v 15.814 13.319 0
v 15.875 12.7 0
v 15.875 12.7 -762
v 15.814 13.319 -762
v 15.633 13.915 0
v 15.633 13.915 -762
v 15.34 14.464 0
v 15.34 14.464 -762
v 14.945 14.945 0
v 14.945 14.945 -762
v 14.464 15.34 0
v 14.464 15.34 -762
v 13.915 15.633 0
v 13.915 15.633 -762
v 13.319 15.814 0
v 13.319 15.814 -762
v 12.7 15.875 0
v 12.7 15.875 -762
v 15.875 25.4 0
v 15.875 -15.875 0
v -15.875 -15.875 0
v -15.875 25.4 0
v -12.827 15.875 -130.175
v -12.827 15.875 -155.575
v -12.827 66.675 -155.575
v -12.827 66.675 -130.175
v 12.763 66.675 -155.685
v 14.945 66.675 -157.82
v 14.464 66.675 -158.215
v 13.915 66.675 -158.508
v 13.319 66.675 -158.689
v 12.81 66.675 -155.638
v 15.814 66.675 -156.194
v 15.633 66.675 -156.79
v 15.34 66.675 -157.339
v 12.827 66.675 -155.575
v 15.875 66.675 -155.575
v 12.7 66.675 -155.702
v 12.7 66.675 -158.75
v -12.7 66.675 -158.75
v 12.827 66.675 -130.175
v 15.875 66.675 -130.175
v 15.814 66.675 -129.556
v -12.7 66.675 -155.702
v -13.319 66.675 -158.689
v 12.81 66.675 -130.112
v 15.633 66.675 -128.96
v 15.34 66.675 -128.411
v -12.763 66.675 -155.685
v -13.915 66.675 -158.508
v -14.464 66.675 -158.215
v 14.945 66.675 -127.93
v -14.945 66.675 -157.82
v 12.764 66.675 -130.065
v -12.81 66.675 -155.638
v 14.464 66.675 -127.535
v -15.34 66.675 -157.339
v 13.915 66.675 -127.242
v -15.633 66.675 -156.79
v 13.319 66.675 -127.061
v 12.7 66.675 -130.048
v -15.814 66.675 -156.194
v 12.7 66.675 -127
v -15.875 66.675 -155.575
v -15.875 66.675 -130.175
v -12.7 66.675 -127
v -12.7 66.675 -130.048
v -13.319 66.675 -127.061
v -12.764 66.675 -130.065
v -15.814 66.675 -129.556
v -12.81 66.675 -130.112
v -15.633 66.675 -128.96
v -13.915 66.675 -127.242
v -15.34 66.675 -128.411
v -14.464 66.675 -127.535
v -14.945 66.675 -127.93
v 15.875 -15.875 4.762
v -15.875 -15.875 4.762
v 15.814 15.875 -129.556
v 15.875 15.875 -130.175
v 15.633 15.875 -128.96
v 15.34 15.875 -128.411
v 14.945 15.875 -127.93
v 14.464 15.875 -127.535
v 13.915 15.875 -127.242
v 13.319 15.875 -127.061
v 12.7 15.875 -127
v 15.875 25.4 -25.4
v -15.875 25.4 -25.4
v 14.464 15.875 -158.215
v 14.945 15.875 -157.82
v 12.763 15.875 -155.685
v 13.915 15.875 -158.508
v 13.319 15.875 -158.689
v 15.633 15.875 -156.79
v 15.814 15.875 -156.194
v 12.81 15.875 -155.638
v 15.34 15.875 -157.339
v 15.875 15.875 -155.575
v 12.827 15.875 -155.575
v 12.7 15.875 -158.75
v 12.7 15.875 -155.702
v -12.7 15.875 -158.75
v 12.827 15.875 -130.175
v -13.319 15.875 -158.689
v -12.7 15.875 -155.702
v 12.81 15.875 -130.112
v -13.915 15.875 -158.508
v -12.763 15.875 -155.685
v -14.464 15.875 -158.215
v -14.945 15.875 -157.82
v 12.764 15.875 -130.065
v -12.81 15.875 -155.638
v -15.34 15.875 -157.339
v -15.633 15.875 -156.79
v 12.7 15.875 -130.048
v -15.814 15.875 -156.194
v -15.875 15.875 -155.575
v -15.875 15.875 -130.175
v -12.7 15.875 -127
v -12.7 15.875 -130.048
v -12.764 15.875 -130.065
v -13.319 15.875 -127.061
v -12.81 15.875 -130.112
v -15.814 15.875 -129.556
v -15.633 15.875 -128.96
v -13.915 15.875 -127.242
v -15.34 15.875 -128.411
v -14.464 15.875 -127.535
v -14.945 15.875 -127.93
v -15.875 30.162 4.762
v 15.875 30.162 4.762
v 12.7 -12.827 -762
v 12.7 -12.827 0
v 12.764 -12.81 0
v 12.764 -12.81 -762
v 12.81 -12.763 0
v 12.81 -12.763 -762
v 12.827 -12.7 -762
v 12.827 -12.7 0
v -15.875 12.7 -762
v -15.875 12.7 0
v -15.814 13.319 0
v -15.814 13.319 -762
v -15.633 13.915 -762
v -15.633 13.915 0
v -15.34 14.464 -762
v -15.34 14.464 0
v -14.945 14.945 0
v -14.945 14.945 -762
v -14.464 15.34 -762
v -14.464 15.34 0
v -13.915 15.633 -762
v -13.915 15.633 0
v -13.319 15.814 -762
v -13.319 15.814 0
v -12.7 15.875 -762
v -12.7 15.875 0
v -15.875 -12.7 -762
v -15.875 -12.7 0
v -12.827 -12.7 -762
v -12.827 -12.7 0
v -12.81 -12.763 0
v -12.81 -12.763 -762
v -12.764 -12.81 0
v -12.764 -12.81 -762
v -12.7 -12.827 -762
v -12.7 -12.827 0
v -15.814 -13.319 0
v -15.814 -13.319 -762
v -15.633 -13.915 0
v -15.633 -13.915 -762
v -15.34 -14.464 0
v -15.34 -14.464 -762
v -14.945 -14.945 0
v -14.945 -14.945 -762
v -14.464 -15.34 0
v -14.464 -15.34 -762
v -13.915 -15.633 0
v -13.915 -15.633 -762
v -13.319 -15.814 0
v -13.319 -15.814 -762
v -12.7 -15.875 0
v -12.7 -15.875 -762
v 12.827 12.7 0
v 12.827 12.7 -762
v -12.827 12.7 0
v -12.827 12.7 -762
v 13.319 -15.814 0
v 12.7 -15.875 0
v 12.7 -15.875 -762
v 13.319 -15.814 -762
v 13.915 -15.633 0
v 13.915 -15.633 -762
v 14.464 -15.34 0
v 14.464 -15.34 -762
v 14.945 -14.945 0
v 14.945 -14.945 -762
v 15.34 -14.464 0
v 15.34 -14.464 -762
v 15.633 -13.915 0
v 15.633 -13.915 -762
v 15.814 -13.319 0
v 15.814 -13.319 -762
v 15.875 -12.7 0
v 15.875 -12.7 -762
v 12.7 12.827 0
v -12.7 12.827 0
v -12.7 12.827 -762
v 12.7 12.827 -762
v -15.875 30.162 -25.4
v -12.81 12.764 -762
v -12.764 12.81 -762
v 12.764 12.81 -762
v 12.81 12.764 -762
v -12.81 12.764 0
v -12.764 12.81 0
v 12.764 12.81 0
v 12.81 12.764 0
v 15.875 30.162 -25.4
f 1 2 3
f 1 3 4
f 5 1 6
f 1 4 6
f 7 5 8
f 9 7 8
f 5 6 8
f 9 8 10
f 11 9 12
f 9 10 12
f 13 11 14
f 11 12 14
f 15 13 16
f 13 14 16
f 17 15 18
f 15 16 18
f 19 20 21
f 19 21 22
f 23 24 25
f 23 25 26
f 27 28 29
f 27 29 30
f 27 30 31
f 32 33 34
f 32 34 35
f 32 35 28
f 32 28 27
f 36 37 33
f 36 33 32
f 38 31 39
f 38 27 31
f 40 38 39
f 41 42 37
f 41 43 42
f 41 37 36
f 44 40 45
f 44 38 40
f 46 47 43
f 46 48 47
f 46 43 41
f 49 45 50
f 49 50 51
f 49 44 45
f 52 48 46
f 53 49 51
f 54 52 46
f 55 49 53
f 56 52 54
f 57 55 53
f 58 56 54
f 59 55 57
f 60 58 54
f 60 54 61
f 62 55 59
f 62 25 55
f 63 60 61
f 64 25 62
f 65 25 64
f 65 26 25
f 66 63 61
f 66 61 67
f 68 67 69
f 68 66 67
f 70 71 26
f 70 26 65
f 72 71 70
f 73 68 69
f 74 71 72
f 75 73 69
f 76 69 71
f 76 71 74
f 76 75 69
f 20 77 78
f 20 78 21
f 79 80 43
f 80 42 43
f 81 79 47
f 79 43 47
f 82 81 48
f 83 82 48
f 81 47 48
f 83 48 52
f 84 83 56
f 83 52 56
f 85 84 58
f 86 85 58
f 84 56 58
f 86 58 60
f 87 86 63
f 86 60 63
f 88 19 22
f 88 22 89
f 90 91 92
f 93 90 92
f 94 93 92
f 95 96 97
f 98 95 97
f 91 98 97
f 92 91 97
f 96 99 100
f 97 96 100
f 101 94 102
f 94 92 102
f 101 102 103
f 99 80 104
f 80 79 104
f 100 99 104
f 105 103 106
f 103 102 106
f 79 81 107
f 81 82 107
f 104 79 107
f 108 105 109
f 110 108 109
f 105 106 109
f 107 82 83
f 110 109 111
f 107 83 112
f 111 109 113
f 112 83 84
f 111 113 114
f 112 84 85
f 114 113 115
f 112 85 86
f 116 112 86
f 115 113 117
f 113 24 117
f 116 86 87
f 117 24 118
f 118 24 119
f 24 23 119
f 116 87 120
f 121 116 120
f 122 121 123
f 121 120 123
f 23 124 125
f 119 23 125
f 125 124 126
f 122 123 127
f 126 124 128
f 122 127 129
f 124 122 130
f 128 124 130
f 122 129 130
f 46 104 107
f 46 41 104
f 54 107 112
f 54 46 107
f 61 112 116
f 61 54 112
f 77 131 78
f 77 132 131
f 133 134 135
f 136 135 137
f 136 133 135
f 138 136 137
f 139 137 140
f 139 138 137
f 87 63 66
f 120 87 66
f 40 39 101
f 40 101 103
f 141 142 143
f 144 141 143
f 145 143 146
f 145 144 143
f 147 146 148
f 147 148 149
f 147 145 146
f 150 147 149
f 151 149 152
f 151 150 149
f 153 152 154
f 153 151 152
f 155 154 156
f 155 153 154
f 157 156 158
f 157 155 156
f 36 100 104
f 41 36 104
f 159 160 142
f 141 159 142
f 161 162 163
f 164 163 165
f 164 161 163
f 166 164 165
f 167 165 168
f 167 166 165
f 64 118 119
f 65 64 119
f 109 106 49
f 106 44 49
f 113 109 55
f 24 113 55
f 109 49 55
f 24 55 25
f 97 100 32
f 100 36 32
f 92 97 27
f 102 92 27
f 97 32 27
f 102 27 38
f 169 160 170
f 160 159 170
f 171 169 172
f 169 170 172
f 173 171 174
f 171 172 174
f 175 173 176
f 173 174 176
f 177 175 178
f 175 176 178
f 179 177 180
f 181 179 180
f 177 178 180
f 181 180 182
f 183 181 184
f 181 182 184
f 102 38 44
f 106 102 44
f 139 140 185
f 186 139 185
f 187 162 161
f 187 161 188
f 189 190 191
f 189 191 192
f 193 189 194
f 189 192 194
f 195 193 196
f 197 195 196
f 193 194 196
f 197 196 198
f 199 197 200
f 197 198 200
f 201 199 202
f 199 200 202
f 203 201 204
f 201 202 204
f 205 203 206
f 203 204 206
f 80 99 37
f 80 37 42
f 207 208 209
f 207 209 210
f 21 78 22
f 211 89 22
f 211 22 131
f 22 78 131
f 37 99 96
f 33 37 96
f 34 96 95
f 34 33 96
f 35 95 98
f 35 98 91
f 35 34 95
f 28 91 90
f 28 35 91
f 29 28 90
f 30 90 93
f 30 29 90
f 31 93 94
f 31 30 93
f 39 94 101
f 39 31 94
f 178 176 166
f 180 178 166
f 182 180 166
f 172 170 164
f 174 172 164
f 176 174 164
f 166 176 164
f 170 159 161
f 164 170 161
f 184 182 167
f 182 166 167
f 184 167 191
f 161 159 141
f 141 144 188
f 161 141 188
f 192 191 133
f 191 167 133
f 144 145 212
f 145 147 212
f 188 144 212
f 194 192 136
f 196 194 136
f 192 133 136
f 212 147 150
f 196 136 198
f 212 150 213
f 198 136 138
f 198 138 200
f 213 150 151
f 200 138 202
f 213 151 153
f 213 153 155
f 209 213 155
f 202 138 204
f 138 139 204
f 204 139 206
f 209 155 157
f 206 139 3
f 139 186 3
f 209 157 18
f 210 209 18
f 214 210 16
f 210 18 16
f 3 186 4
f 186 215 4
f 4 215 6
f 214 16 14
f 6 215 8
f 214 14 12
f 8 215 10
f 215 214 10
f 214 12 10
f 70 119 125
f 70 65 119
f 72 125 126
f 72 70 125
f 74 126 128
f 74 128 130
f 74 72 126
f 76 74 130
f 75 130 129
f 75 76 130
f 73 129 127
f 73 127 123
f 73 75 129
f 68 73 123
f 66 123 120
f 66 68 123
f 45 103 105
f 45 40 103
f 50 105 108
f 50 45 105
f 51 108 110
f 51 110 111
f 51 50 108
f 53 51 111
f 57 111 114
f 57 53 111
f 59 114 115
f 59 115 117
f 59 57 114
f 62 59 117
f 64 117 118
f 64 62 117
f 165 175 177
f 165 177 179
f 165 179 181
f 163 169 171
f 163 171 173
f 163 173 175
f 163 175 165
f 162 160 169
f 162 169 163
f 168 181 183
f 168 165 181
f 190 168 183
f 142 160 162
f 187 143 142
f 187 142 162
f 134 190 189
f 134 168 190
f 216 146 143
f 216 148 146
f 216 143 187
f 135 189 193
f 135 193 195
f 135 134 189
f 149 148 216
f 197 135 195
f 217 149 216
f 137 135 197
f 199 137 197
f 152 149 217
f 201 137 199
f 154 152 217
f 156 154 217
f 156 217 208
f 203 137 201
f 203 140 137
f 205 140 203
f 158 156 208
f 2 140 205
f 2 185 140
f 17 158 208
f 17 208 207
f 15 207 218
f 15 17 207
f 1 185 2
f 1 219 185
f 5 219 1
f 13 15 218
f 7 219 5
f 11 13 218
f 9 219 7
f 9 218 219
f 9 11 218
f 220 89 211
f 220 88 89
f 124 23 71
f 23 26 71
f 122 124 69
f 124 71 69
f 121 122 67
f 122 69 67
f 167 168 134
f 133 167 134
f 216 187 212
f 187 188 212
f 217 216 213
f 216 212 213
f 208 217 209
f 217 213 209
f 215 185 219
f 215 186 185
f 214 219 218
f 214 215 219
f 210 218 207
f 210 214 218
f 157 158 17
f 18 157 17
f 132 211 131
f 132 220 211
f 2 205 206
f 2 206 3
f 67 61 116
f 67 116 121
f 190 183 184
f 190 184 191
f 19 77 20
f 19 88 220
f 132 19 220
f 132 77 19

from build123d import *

# Parameters (mm, degrees)
F0_W     = 31.75
F0_H     = 31.75
F1_DEPTH = 762
F2_R     = 3.175
F3_T     = -3.048
F5_DEPTH = 15.875
F6_W     = 31.75
F6_H     = 31.75
F7_DEPTH = 50.8
F8_R     = 3.175
F9_T     = -3.048


with BuildPart() as f1:
    # F0 (on Top) → F1 (new body)
    with BuildSketch(Plane.XY):
        Rectangle(F0_W, F0_H)
    extrude(amount=-F1_DEPTH)

    # F2
    f2_edges = [f1.edges().sort_by_distance(p)[0] for p in [
        (-15.875, 15.875, -381),
        (-15.875, -15.875, -381),
        (15.875, 15.875, -381),
        (15.875, -15.875, -381),
    ]]
    fillet(f2_edges, radius=F2_R)

    # F3
    f3_openings = [f1.faces().sort_by_distance(p)[0] for p in [
        (0, 0, 0),
        (0, 0, -762),
    ]]
    offset(amount=F3_T, openings=f3_openings)


with BuildPart() as f5:
    # F4 (on Right) → F5 (new body, symmetric)
    with BuildSketch(Plane.YZ):
        Polygon((30.1625, 4.7625), (-15.875, 4.7625), (-15.875, 0), (25.4, 0), (25.4, -25.4), (30.1625, -25.4), align=None)
    extrude(amount=F5_DEPTH, both=True)


with BuildPart() as f7:
    # F6 (on face) → F7 (new body)
    with BuildSketch(Plane(origin=(0, 15.875, 0), x_dir=(-1, 0, 0), z_dir=(0, 1, 0))):
        with Locations((0, -142.875)):
            Rectangle(F6_W, F6_H)
    extrude(amount=F7_DEPTH)

    # F8
    f8_edges = [f7.edges().sort_by_distance(p)[0] for p in [
        (-15.875, 41.275, -127),
        (-15.875, 41.275, -158.75),
        (15.875, 41.275, -127),
        (15.875, 41.275, -158.75),
    ]]
    fillet(f8_edges, radius=F8_R)

    # F9
    f9_openings = [f7.faces().sort_by_distance(p)[0] for p in [
        (0, 66.675, -142.875),
        (0, 15.875, -142.875),
    ]]
    offset(amount=F9_T, openings=f9_openings)


solid = Compound([f1.part, f5.part, f7.part])
